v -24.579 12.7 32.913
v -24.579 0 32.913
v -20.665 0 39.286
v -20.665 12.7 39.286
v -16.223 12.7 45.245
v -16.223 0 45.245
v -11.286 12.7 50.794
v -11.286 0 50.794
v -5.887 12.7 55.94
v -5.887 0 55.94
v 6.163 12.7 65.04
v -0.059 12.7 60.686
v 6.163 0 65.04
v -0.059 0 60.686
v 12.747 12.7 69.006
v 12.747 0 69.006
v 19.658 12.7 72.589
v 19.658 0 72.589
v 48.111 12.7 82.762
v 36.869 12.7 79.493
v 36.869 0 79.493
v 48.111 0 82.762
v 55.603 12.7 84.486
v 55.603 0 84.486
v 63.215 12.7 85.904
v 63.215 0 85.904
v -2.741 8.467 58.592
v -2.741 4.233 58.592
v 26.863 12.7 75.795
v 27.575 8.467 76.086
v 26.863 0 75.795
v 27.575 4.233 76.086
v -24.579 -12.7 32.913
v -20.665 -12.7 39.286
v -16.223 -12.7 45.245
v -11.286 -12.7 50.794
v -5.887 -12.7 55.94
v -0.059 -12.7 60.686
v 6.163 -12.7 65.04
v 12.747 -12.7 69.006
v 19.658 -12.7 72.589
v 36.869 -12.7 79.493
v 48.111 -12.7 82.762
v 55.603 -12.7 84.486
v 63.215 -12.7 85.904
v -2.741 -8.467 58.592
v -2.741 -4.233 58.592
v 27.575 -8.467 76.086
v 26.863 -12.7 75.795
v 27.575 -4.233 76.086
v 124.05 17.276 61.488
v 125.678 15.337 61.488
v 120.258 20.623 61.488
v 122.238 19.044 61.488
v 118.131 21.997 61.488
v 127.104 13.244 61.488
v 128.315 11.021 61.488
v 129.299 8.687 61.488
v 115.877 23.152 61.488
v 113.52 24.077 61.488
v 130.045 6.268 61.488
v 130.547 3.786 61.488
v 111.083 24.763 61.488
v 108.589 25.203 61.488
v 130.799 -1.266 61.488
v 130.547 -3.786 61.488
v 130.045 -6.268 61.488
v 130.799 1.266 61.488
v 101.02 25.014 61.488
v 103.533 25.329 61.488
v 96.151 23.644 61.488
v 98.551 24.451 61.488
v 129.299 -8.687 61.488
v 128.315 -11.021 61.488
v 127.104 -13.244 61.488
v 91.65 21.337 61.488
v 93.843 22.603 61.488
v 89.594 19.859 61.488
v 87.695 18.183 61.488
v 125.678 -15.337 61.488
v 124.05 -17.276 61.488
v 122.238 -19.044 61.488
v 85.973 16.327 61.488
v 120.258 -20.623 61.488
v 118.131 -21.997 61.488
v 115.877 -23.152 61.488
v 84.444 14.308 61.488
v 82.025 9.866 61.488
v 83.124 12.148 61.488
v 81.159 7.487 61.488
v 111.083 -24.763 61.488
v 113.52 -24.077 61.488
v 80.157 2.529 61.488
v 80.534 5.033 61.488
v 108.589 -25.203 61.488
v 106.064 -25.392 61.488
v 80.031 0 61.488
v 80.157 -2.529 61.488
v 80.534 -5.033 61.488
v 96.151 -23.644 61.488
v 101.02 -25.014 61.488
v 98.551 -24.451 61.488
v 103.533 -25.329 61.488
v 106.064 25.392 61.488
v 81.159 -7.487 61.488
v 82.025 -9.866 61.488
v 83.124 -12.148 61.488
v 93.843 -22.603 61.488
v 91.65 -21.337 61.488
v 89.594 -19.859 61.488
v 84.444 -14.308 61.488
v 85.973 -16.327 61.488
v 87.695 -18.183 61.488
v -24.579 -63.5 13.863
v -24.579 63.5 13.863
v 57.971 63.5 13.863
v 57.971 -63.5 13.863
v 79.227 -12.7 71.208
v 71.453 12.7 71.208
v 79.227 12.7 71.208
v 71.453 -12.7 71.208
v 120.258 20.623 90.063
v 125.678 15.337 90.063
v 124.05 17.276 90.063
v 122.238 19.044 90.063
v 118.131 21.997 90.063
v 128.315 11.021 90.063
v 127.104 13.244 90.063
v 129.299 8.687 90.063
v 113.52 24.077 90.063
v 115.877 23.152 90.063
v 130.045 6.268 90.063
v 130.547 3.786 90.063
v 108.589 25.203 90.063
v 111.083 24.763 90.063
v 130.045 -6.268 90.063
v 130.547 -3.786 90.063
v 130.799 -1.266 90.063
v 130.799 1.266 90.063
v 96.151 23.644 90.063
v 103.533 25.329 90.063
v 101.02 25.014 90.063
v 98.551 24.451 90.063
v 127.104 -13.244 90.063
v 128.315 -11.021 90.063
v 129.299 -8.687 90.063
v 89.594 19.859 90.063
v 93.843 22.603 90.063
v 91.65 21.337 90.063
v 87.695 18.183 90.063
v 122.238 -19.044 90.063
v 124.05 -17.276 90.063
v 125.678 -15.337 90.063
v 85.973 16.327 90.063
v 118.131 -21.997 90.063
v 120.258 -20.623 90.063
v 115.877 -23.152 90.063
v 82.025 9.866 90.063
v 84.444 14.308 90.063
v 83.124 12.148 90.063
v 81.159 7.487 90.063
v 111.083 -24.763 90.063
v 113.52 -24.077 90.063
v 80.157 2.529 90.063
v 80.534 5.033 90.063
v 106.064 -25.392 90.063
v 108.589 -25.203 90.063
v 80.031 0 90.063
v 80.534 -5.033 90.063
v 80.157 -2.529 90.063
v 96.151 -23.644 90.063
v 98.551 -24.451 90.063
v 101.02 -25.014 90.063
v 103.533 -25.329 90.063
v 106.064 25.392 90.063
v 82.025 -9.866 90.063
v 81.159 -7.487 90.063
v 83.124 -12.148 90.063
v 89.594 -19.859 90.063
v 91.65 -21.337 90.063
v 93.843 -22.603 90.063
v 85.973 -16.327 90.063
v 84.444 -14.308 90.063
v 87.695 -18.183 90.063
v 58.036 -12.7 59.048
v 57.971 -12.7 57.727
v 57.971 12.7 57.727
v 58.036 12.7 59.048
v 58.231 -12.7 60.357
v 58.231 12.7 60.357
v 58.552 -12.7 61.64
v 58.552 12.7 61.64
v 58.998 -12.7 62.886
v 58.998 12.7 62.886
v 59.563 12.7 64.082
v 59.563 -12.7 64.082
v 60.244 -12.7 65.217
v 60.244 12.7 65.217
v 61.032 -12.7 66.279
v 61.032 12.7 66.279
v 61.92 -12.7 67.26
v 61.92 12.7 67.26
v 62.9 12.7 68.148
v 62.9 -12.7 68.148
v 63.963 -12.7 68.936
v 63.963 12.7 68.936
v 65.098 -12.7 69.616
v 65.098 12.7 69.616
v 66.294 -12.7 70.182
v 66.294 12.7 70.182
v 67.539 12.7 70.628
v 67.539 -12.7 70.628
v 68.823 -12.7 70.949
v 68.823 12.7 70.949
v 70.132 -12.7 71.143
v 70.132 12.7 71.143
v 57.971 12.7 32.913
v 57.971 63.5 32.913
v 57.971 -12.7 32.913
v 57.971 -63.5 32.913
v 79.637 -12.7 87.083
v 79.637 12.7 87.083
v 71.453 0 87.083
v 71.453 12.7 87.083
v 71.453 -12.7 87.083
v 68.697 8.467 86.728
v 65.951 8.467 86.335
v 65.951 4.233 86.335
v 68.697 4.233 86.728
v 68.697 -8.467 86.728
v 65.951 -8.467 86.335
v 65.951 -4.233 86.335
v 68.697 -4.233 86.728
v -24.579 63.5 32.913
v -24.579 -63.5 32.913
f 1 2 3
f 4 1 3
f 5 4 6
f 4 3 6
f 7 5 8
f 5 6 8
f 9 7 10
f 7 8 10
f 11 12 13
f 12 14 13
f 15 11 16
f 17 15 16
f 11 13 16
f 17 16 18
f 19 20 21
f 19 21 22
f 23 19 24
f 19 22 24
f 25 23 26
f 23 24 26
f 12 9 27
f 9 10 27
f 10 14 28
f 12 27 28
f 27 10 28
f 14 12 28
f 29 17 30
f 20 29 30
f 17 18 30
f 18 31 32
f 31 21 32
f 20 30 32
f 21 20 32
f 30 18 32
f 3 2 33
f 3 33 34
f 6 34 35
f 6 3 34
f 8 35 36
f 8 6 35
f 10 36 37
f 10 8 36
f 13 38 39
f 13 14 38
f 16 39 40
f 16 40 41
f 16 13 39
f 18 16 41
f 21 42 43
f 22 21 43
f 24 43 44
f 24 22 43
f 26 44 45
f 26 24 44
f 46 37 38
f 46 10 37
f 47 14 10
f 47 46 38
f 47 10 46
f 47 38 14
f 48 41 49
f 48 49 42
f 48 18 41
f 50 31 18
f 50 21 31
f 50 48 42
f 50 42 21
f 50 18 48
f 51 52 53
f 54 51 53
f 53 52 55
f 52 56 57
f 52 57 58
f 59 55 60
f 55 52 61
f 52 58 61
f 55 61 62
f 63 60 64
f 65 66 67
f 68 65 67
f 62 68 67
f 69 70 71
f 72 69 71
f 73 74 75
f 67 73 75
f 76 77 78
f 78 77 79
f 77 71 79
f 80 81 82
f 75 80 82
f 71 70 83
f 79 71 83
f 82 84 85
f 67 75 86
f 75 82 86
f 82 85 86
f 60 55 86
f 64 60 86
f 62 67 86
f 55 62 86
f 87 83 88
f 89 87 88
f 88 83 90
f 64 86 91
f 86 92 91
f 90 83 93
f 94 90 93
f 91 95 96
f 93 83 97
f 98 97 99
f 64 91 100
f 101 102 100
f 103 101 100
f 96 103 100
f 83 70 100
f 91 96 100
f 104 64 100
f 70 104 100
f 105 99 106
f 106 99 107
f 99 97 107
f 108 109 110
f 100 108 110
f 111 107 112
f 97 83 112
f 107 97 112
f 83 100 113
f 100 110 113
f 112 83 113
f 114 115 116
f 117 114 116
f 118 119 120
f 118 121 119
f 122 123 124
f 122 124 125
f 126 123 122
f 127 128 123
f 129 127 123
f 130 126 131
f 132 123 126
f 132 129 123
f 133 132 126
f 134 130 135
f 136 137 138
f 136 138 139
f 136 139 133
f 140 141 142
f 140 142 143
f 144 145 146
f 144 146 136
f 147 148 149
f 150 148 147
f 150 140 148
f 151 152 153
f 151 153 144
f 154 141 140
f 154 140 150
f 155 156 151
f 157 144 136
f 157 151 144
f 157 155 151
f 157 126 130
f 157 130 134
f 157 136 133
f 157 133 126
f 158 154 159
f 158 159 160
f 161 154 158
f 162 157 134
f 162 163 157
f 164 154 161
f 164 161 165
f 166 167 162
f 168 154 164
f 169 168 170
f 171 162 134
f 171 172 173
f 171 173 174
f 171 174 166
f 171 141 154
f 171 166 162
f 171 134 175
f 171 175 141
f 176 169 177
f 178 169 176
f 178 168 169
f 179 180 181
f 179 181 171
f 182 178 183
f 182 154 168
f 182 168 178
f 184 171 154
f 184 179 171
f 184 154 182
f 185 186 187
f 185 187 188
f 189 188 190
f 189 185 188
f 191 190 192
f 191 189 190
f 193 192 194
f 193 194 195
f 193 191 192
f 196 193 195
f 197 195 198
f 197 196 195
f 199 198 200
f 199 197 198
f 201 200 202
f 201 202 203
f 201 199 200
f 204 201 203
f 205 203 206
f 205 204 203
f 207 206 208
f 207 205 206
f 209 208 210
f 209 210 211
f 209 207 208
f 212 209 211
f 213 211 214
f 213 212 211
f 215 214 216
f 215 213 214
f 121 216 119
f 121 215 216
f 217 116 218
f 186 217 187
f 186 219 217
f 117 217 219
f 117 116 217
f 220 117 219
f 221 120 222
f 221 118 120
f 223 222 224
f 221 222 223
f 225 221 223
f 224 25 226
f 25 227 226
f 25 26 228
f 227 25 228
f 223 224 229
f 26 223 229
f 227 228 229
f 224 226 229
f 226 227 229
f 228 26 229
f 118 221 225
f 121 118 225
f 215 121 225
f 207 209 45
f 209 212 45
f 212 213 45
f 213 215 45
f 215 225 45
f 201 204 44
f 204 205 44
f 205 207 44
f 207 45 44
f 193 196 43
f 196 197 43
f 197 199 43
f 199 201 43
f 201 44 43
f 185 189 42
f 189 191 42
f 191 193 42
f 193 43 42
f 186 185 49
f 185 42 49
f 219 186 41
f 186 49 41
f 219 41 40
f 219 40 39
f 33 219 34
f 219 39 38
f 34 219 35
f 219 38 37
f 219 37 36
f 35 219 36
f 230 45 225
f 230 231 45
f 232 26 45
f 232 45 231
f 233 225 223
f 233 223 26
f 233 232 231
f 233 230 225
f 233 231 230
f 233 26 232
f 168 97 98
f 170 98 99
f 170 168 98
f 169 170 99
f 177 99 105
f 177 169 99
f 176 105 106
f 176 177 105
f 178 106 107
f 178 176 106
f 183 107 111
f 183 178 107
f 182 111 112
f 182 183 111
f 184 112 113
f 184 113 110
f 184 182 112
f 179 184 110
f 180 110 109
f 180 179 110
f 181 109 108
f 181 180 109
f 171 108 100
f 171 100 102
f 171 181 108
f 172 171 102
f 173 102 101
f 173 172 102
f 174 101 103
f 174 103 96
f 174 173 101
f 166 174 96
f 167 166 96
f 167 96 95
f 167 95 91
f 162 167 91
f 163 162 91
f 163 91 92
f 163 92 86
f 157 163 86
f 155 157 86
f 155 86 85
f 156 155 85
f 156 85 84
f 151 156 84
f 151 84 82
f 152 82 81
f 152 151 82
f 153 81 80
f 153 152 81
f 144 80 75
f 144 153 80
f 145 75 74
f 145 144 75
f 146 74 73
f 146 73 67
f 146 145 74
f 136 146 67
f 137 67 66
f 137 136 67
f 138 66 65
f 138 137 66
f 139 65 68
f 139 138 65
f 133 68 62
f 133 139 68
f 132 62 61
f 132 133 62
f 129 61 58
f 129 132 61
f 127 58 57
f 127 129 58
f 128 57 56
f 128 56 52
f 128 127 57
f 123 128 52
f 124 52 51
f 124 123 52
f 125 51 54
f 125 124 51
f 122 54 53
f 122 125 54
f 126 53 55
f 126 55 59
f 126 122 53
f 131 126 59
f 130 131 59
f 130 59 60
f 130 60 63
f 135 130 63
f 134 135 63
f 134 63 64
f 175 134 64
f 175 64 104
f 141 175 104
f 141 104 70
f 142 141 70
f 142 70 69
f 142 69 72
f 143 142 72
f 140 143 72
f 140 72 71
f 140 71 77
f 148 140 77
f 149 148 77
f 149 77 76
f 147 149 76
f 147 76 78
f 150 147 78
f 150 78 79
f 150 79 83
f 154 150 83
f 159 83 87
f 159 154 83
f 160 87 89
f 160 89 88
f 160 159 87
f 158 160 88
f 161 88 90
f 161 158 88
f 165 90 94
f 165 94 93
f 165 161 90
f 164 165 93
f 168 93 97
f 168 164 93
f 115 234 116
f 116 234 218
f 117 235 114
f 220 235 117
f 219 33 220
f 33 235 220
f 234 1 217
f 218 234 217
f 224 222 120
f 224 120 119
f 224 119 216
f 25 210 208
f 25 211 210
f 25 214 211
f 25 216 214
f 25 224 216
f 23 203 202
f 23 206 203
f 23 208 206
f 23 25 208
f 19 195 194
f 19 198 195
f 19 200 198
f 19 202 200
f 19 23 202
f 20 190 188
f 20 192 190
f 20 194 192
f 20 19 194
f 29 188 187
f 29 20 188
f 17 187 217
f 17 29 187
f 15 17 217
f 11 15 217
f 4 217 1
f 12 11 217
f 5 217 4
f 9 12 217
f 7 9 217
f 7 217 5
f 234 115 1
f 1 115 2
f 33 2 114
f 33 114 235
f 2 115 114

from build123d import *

# Parameters (mm, degrees)
F0_W     = 82.55
F0_H     = 19.05
F1_DEPTH = 63.5
F0_W_2   = 25.4
F0_H_2   = 28.575
F3_DEPTH = 12.7


with BuildPart() as f1:
    # F0 (on Front) → F1 (new body, symmetric)
    with BuildSketch(Plane.XZ):
        with Locations((16.696466, 23.387751)):
            Rectangle(F0_W, F0_H)
    extrude(amount=F1_DEPTH, both=True)

    # F0 (on Front) → F3 (join, symmetric)
    with BuildSketch(Plane.XZ):
        with BuildLine():
            add(Edge.make_bspline(
                [(-24.578534, 32.912751), (-8.033848, 62.853972), (25.966635, 79.755312), (63.214536, 85.903594)],
                knots=[0, 0, 0, 0, 102.7259, 102.7259, 102.7259, 102.7259], degree=3))
            Line((-24.578534, 32.912751), (57.971466, 32.912751))
            Line((57.971466, 32.912751), (57.971466, 57.726823))
            ThreePointArc((57.971466, 57.726823), (61.920092, 67.25965), (71.452919, 71.208276))
            Line((71.452919, 71.208276), (79.226701, 71.208276))
            Line((79.226701, 71.208276), (79.637459, 87.083276))
            Line((79.637459, 87.083276), (71.452919, 87.083276))
            add(Edge.make_bspline(
                [(63.214536, 85.903594), (65.945078, 86.354307), (68.693071, 86.747235), (71.452919, 87.083276)],
                knots=[102.7259, 102.7259, 102.7259, 102.7259, 110.256455, 110.256455, 110.256455, 110.256455], degree=3))
        make_face()
    extrude(amount=F3_DEPTH, both=True)


with BuildPart() as f2:
    # F0 (on Front) → F2 (revolve)
    with BuildSketch(Plane.XZ):
        with Locations((92.730703, 75.775251)):
            Rectangle(F0_W_2, F0_H_2)
    revolve(axis=Axis((105.430703, 0, 75.775251), (0, 0, 1)))


solid = Compound([f1.part, f2.part])
